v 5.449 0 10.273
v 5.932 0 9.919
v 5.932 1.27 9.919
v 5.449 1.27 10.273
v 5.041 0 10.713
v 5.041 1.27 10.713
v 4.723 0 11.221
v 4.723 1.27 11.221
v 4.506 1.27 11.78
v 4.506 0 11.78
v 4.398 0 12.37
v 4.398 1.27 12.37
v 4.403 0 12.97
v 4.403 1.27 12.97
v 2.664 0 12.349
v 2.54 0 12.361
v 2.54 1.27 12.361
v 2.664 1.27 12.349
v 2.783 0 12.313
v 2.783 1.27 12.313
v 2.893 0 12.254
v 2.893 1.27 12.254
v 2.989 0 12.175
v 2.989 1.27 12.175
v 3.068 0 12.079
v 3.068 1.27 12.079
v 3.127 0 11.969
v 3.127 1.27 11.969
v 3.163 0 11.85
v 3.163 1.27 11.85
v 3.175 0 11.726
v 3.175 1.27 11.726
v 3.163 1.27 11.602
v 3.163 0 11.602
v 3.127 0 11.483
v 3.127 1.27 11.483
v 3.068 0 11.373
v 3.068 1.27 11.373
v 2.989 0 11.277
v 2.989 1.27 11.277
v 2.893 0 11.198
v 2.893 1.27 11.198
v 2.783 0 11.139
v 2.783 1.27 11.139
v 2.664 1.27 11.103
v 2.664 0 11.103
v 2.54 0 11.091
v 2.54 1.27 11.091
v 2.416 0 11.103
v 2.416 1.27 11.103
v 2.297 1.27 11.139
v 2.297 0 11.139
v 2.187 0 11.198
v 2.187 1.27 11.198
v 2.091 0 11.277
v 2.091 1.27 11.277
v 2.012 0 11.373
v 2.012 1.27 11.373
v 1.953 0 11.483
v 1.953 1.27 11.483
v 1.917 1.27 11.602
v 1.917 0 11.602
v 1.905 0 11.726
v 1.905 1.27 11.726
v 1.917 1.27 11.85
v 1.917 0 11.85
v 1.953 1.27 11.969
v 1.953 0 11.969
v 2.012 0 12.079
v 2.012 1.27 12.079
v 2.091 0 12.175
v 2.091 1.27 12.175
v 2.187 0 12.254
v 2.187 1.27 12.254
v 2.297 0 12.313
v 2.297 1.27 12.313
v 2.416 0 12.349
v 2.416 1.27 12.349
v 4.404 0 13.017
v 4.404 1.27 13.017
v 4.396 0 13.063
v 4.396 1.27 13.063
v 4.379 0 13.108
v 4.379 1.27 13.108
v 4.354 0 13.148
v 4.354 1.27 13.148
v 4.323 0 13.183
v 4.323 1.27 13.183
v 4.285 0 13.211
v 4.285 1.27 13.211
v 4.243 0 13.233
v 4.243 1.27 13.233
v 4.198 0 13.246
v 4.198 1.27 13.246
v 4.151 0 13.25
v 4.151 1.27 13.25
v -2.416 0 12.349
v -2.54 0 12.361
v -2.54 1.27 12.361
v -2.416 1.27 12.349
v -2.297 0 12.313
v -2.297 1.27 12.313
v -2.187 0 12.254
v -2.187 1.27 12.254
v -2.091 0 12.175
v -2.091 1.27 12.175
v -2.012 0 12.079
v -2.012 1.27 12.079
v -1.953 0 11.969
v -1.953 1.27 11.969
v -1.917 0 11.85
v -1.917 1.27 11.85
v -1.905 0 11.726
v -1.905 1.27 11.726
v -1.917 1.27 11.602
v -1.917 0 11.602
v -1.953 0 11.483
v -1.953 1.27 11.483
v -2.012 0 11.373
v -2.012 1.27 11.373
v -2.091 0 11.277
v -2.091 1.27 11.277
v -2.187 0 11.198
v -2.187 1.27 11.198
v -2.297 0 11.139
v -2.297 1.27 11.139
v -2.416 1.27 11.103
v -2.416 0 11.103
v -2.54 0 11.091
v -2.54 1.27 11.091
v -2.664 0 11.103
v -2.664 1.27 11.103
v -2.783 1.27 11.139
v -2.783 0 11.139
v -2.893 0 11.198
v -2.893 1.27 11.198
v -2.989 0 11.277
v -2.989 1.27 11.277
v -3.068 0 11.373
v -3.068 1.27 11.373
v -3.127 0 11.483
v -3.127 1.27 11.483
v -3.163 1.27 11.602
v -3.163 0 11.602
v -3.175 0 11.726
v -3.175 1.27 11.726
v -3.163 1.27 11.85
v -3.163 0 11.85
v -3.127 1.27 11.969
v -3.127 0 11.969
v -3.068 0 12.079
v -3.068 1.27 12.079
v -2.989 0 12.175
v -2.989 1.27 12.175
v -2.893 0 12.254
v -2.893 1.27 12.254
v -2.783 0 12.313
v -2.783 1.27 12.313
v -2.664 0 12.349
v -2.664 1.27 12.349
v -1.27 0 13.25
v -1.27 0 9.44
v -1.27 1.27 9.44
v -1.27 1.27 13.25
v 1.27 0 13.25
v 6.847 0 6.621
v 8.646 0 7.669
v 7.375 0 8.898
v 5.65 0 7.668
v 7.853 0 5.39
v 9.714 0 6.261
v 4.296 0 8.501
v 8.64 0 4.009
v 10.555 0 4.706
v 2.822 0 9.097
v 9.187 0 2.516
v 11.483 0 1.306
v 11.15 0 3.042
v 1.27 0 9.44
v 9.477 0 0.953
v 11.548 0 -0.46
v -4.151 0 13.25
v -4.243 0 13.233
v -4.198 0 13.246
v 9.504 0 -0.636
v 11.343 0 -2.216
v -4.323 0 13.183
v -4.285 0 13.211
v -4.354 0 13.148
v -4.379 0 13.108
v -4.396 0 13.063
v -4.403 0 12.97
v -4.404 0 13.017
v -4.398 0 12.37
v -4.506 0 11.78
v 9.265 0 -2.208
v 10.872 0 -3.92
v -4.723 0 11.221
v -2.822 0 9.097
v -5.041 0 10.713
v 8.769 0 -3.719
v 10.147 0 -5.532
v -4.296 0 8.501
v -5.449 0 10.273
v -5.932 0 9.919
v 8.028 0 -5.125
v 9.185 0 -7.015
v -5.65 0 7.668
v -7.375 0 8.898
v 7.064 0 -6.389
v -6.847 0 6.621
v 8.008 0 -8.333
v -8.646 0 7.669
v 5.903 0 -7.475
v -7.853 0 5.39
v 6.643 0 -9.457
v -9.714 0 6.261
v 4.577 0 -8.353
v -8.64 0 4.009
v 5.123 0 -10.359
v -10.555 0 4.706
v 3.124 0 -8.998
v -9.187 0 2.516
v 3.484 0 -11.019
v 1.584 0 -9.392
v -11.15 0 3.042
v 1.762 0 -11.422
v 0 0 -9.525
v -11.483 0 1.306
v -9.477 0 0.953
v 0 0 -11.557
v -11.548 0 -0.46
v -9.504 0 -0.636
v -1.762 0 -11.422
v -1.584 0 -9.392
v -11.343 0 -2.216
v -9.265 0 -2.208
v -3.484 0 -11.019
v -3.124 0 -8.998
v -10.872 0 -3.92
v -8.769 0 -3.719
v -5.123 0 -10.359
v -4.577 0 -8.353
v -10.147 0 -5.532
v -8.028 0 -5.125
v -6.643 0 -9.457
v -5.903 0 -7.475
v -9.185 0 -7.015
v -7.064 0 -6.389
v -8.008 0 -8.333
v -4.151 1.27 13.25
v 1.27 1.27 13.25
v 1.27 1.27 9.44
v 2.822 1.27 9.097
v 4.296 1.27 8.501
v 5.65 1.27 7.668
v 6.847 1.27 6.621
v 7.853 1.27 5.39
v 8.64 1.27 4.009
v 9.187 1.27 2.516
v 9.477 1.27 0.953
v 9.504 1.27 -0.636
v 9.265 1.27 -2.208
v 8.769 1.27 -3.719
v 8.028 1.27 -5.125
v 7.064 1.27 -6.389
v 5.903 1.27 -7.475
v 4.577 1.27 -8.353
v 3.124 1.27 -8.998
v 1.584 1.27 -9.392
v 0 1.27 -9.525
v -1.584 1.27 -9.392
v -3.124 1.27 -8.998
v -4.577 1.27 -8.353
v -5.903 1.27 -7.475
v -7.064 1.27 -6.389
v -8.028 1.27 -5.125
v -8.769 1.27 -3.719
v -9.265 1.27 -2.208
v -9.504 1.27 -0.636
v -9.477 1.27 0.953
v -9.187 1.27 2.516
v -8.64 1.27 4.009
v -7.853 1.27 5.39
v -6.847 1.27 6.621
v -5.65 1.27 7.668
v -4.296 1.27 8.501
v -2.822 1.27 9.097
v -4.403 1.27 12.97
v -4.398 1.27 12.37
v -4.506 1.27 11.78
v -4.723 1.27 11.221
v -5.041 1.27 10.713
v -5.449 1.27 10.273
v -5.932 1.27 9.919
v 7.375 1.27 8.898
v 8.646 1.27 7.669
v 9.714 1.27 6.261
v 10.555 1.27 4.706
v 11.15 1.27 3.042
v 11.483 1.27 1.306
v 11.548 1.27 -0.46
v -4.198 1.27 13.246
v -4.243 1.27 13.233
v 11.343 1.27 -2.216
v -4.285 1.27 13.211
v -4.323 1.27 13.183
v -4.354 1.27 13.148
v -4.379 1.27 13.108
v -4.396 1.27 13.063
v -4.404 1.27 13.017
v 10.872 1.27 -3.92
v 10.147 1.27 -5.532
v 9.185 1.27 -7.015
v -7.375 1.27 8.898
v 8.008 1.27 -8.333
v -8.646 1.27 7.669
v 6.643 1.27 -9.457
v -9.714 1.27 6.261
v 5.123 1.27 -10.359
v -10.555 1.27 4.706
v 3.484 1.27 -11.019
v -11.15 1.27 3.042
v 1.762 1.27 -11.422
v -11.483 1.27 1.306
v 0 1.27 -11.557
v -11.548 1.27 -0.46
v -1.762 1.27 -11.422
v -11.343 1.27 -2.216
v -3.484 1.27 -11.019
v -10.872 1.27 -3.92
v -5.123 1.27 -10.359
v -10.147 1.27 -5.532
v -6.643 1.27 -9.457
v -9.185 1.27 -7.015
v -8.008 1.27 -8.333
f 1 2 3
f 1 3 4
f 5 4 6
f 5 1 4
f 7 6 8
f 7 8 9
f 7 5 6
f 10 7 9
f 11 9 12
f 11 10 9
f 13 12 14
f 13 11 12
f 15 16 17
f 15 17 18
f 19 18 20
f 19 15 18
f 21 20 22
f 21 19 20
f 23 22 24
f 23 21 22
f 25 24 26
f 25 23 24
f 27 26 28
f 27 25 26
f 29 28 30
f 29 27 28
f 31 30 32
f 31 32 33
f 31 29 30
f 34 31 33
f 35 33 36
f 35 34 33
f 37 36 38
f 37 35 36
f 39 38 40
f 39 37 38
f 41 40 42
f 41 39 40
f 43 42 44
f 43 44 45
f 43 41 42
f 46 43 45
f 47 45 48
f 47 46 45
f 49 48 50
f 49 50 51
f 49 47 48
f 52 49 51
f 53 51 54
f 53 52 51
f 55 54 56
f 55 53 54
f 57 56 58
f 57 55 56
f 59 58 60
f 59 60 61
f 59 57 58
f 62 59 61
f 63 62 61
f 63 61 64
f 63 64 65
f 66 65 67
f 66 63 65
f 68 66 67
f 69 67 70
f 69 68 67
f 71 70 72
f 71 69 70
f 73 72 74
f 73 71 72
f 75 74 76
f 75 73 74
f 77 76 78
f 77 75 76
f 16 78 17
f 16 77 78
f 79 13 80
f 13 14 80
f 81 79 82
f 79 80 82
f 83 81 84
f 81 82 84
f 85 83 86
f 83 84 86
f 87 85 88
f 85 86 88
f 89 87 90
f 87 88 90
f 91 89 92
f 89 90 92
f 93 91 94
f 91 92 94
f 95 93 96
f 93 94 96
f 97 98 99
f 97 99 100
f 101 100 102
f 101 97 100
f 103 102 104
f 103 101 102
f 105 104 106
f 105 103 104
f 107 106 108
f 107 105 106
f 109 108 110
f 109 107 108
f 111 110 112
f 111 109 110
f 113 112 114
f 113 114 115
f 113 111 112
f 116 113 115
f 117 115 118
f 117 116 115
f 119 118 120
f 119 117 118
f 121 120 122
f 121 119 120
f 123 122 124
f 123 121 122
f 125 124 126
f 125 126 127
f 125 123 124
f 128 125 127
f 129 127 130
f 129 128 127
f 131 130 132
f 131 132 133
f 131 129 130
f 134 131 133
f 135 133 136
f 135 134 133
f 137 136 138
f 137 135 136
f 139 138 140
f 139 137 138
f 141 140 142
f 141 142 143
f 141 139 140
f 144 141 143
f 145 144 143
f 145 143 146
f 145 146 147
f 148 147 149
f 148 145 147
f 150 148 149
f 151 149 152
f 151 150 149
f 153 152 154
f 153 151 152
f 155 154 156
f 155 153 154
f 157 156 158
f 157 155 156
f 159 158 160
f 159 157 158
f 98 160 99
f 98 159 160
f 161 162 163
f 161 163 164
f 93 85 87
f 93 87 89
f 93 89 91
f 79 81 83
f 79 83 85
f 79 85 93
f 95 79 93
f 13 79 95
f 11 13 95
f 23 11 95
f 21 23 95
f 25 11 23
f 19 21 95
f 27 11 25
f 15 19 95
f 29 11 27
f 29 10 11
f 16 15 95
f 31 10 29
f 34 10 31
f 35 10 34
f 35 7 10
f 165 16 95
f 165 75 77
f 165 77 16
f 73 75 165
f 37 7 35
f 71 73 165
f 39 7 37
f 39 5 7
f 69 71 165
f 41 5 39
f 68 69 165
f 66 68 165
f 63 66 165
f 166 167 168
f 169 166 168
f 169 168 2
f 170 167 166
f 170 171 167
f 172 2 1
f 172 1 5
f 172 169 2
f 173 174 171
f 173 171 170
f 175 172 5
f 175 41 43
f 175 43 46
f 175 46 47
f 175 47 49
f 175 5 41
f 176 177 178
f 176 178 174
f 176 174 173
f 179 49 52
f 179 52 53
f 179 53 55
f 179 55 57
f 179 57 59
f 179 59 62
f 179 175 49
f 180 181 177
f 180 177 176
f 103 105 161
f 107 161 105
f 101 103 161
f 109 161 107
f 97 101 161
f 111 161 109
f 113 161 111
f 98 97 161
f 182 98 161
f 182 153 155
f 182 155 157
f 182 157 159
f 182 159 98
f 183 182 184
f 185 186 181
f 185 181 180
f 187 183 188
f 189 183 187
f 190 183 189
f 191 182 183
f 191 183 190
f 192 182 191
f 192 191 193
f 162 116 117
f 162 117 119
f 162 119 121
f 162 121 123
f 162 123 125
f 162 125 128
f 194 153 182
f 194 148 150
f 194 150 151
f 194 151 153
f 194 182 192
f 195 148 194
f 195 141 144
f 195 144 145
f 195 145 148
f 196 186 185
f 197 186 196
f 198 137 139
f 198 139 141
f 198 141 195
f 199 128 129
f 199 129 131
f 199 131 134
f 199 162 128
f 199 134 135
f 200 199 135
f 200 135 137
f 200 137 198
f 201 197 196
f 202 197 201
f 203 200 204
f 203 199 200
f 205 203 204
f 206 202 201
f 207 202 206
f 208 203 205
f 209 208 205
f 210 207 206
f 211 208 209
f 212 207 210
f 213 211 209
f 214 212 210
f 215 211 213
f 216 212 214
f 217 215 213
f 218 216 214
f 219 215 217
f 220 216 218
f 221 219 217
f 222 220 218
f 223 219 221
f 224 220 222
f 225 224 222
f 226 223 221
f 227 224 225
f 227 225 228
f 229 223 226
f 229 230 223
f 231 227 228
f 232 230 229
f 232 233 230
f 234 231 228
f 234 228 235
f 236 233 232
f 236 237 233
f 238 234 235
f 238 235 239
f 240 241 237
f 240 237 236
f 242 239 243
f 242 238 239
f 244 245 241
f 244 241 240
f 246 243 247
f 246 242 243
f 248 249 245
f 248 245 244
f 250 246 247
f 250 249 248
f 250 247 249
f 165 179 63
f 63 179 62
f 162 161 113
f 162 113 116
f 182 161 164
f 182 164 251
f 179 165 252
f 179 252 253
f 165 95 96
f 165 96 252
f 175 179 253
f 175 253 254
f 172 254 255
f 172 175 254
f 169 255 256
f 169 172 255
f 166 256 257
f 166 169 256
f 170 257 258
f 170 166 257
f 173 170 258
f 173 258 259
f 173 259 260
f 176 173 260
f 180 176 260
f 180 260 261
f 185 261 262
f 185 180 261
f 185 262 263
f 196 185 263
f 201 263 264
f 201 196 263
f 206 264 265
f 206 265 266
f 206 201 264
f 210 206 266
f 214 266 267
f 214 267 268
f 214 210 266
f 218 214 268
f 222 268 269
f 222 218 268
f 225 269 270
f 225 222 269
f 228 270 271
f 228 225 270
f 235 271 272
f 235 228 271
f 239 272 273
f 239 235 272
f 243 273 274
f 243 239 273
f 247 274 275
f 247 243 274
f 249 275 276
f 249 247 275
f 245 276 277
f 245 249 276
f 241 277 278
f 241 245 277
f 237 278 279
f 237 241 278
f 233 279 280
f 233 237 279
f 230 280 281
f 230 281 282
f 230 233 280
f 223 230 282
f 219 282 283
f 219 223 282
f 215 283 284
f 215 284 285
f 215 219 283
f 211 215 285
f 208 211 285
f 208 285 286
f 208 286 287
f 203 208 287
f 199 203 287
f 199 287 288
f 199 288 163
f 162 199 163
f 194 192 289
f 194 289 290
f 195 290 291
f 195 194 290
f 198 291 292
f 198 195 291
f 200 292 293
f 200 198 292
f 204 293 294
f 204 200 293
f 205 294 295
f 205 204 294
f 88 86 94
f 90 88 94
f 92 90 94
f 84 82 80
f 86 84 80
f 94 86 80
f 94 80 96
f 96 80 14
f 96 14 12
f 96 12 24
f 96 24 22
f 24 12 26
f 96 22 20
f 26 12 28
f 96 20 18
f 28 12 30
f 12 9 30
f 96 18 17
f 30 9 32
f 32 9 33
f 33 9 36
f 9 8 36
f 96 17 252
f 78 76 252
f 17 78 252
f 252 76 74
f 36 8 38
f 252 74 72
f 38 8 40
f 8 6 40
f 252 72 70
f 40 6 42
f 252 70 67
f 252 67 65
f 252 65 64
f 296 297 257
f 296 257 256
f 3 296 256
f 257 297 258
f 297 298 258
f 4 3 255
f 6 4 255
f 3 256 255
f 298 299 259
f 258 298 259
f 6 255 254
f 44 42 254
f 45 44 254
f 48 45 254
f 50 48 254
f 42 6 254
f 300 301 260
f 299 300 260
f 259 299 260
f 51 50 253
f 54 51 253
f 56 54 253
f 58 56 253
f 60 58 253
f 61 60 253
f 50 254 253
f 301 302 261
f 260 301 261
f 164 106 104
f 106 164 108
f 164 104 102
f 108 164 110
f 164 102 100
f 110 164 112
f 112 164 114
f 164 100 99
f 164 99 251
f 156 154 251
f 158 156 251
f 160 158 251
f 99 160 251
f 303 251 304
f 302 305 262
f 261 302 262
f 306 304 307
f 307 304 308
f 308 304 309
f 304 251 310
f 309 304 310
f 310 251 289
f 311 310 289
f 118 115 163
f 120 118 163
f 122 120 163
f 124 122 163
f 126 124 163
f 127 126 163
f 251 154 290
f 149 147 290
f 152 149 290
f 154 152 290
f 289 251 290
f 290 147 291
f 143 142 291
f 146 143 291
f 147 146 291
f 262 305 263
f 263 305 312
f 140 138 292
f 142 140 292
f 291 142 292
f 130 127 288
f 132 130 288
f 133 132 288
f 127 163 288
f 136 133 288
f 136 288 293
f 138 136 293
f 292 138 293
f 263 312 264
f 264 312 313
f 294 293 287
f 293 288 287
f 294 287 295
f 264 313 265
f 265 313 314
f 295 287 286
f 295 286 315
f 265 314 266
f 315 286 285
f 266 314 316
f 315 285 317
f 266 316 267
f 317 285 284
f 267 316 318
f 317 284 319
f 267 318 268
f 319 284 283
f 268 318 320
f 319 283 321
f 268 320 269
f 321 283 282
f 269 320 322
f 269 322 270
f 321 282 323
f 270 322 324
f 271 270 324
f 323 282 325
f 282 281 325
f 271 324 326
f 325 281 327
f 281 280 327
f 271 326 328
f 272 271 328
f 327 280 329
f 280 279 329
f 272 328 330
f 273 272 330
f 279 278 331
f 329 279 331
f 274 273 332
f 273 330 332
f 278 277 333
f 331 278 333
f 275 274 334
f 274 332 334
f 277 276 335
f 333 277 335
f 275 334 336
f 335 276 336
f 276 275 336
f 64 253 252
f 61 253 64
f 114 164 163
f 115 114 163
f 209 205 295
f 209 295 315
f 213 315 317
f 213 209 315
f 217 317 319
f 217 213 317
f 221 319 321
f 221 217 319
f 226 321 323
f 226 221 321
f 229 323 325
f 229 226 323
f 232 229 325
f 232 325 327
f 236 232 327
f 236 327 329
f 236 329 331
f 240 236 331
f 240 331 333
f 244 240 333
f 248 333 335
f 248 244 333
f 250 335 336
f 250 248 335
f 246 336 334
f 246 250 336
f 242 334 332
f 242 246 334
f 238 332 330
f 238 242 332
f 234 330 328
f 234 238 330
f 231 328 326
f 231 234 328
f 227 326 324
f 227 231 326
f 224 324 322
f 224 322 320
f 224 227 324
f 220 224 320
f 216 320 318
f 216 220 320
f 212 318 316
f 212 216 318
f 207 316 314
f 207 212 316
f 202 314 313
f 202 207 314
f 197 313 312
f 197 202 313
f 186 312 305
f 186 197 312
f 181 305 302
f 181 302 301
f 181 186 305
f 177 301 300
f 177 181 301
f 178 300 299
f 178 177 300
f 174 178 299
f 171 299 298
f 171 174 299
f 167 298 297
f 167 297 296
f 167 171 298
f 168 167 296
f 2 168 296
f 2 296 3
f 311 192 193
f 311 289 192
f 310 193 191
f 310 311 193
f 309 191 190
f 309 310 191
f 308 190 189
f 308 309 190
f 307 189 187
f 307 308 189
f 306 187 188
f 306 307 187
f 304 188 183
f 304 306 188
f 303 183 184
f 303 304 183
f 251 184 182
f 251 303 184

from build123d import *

# Parameters (mm, degrees)
SKETCH1_R           = 0.635
BOSS_EXTRUDE1_DEPTH = 1.27
FILLET1_R           = 0.254


with BuildPart() as part:
    # Sketch1 → Boss-Extrude1 (new body)
    with BuildSketch(Plane(origin=(0, 0, 0), x_dir=(1, 0, 0), z_dir=(0, 1, 0))):
        with BuildLine():
            ThreePointArc((-4.445, -13.249953655), (-4.662189736, -11.349360189), (-5.931882655, -9.9185189))
            ThreePointArc((-5.931882655, -9.9185189), (0, 11.557), (5.931882655, -9.9185189))
            ThreePointArc((5.931882655, -9.9185189), (4.662189736, -11.349360189), (4.445, -13.249953655))
            Line((4.445, -13.249953655), (1.27, -13.249953655))
            Line((1.27, -13.249953655), (1.27, -9.439953655))
            ThreePointArc((1.27, -9.439953655), (0, 9.525), (-1.27, -9.439953655))
            Line((-1.27, -9.439953655), (-1.27, -13.249953655))
            Line((-1.27, -13.249953655), (-4.445, -13.249953655))
        make_face()
        with Locations(Location((2.54, -11.725953655, 0), (0, 0, 270))):
            Circle(SKETCH1_R, mode=Mode.SUBTRACT)
        with Locations(Location((-2.54, -11.725953655, 0), (0, 0, 270))):
            Circle(SKETCH1_R, mode=Mode.SUBTRACT)
    extrude(amount=BOSS_EXTRUDE1_DEPTH)

    # Fillet1
    fillet1_edges = [part.edges().sort_by_distance(p)[0] for p in [
        (4.445, 0.635, 13.249953655),
        (-4.445, 0.635, 13.249953655),
    ]]
    fillet(fillet1_edges, radius=FILLET1_R)


solid = part.part
